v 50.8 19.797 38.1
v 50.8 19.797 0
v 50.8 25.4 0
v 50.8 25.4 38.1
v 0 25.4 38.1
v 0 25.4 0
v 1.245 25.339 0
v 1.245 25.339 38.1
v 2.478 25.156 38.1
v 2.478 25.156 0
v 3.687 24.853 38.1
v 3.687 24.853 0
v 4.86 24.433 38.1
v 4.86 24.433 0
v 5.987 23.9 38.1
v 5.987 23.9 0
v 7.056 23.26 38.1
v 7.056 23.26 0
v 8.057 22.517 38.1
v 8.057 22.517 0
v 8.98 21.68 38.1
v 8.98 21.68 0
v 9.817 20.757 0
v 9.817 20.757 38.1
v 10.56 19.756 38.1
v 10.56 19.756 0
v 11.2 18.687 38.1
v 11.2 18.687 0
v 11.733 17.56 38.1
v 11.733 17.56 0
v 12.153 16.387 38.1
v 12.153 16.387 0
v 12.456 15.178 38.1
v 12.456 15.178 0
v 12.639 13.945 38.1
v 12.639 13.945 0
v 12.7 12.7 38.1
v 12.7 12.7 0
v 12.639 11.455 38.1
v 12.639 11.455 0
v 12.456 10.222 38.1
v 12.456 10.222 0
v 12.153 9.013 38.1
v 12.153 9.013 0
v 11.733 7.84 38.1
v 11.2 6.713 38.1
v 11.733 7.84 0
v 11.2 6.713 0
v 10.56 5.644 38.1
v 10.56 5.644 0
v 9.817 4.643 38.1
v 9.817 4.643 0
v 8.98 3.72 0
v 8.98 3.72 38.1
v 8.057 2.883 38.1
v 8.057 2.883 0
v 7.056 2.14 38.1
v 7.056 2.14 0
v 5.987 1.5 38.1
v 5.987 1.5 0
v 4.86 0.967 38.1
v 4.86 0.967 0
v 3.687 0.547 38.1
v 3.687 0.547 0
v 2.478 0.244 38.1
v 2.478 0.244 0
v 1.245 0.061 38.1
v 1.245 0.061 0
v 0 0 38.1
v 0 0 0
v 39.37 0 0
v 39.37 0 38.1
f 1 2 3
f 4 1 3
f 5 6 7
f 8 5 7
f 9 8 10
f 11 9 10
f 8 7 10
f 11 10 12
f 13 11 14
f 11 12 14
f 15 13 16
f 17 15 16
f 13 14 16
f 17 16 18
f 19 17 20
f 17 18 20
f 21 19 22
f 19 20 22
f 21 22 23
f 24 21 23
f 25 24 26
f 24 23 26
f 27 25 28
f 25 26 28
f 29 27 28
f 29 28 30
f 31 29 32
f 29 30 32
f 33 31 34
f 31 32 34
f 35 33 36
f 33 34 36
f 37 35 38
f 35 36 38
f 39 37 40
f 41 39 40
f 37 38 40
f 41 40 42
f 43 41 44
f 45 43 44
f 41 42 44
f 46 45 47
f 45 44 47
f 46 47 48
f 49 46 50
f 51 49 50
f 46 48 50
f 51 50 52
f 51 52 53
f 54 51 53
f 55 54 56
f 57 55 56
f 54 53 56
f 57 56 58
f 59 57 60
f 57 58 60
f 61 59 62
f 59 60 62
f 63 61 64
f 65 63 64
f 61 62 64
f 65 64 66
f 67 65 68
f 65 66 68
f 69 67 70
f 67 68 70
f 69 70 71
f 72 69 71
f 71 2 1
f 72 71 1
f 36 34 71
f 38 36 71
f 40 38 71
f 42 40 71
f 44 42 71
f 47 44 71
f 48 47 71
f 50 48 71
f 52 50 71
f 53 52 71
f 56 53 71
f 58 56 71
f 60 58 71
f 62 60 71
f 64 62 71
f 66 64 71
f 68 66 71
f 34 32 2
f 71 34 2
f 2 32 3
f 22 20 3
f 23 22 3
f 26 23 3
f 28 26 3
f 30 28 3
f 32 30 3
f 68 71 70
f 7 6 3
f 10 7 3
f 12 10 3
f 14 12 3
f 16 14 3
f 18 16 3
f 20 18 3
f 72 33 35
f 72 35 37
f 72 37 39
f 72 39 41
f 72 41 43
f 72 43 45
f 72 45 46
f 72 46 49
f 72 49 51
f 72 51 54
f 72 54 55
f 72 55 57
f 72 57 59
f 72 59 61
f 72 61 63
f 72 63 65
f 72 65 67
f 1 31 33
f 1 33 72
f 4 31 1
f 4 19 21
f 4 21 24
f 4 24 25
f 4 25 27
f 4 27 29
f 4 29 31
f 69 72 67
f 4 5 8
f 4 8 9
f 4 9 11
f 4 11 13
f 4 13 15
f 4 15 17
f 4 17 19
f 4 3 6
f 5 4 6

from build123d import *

# Parameters (mm, degrees)
BOSS_EXTRUDE1_DEPTH = 38.1
CHAMFER1_SIZE       = 11.43
CHAMFER1_SIZE2      = 19.797340731


with BuildPart() as part:
    # Sketch1 → Boss-Extrude1 (new body)
    with BuildSketch(Plane.XY):
        with BuildLine():
            Line((0, 0), (50.8, 0))
            Line((50.8, 0), (50.8, 25.4))
            Line((50.8, 25.4), (0, 25.4))
            ThreePointArc((0, 25.4), (12.7, 12.7), (0, 0))
        make_face()
    extrude(amount=BOSS_EXTRUDE1_DEPTH)

    # Chamfer1
    chamfer1_edges = [part.edges().sort_by_distance(p)[0] for p in [
        (50.8, 0, 19.05),
    ]]
    chamfer1_side = [part.faces().sort_by_distance(p)[0] for p in [
        (25.4, 0, 19.05),
    ]]
    chamfer(chamfer1_edges, length=CHAMFER1_SIZE, length2=CHAMFER1_SIZE2, reference=chamfer1_side[0])


solid = part.part
